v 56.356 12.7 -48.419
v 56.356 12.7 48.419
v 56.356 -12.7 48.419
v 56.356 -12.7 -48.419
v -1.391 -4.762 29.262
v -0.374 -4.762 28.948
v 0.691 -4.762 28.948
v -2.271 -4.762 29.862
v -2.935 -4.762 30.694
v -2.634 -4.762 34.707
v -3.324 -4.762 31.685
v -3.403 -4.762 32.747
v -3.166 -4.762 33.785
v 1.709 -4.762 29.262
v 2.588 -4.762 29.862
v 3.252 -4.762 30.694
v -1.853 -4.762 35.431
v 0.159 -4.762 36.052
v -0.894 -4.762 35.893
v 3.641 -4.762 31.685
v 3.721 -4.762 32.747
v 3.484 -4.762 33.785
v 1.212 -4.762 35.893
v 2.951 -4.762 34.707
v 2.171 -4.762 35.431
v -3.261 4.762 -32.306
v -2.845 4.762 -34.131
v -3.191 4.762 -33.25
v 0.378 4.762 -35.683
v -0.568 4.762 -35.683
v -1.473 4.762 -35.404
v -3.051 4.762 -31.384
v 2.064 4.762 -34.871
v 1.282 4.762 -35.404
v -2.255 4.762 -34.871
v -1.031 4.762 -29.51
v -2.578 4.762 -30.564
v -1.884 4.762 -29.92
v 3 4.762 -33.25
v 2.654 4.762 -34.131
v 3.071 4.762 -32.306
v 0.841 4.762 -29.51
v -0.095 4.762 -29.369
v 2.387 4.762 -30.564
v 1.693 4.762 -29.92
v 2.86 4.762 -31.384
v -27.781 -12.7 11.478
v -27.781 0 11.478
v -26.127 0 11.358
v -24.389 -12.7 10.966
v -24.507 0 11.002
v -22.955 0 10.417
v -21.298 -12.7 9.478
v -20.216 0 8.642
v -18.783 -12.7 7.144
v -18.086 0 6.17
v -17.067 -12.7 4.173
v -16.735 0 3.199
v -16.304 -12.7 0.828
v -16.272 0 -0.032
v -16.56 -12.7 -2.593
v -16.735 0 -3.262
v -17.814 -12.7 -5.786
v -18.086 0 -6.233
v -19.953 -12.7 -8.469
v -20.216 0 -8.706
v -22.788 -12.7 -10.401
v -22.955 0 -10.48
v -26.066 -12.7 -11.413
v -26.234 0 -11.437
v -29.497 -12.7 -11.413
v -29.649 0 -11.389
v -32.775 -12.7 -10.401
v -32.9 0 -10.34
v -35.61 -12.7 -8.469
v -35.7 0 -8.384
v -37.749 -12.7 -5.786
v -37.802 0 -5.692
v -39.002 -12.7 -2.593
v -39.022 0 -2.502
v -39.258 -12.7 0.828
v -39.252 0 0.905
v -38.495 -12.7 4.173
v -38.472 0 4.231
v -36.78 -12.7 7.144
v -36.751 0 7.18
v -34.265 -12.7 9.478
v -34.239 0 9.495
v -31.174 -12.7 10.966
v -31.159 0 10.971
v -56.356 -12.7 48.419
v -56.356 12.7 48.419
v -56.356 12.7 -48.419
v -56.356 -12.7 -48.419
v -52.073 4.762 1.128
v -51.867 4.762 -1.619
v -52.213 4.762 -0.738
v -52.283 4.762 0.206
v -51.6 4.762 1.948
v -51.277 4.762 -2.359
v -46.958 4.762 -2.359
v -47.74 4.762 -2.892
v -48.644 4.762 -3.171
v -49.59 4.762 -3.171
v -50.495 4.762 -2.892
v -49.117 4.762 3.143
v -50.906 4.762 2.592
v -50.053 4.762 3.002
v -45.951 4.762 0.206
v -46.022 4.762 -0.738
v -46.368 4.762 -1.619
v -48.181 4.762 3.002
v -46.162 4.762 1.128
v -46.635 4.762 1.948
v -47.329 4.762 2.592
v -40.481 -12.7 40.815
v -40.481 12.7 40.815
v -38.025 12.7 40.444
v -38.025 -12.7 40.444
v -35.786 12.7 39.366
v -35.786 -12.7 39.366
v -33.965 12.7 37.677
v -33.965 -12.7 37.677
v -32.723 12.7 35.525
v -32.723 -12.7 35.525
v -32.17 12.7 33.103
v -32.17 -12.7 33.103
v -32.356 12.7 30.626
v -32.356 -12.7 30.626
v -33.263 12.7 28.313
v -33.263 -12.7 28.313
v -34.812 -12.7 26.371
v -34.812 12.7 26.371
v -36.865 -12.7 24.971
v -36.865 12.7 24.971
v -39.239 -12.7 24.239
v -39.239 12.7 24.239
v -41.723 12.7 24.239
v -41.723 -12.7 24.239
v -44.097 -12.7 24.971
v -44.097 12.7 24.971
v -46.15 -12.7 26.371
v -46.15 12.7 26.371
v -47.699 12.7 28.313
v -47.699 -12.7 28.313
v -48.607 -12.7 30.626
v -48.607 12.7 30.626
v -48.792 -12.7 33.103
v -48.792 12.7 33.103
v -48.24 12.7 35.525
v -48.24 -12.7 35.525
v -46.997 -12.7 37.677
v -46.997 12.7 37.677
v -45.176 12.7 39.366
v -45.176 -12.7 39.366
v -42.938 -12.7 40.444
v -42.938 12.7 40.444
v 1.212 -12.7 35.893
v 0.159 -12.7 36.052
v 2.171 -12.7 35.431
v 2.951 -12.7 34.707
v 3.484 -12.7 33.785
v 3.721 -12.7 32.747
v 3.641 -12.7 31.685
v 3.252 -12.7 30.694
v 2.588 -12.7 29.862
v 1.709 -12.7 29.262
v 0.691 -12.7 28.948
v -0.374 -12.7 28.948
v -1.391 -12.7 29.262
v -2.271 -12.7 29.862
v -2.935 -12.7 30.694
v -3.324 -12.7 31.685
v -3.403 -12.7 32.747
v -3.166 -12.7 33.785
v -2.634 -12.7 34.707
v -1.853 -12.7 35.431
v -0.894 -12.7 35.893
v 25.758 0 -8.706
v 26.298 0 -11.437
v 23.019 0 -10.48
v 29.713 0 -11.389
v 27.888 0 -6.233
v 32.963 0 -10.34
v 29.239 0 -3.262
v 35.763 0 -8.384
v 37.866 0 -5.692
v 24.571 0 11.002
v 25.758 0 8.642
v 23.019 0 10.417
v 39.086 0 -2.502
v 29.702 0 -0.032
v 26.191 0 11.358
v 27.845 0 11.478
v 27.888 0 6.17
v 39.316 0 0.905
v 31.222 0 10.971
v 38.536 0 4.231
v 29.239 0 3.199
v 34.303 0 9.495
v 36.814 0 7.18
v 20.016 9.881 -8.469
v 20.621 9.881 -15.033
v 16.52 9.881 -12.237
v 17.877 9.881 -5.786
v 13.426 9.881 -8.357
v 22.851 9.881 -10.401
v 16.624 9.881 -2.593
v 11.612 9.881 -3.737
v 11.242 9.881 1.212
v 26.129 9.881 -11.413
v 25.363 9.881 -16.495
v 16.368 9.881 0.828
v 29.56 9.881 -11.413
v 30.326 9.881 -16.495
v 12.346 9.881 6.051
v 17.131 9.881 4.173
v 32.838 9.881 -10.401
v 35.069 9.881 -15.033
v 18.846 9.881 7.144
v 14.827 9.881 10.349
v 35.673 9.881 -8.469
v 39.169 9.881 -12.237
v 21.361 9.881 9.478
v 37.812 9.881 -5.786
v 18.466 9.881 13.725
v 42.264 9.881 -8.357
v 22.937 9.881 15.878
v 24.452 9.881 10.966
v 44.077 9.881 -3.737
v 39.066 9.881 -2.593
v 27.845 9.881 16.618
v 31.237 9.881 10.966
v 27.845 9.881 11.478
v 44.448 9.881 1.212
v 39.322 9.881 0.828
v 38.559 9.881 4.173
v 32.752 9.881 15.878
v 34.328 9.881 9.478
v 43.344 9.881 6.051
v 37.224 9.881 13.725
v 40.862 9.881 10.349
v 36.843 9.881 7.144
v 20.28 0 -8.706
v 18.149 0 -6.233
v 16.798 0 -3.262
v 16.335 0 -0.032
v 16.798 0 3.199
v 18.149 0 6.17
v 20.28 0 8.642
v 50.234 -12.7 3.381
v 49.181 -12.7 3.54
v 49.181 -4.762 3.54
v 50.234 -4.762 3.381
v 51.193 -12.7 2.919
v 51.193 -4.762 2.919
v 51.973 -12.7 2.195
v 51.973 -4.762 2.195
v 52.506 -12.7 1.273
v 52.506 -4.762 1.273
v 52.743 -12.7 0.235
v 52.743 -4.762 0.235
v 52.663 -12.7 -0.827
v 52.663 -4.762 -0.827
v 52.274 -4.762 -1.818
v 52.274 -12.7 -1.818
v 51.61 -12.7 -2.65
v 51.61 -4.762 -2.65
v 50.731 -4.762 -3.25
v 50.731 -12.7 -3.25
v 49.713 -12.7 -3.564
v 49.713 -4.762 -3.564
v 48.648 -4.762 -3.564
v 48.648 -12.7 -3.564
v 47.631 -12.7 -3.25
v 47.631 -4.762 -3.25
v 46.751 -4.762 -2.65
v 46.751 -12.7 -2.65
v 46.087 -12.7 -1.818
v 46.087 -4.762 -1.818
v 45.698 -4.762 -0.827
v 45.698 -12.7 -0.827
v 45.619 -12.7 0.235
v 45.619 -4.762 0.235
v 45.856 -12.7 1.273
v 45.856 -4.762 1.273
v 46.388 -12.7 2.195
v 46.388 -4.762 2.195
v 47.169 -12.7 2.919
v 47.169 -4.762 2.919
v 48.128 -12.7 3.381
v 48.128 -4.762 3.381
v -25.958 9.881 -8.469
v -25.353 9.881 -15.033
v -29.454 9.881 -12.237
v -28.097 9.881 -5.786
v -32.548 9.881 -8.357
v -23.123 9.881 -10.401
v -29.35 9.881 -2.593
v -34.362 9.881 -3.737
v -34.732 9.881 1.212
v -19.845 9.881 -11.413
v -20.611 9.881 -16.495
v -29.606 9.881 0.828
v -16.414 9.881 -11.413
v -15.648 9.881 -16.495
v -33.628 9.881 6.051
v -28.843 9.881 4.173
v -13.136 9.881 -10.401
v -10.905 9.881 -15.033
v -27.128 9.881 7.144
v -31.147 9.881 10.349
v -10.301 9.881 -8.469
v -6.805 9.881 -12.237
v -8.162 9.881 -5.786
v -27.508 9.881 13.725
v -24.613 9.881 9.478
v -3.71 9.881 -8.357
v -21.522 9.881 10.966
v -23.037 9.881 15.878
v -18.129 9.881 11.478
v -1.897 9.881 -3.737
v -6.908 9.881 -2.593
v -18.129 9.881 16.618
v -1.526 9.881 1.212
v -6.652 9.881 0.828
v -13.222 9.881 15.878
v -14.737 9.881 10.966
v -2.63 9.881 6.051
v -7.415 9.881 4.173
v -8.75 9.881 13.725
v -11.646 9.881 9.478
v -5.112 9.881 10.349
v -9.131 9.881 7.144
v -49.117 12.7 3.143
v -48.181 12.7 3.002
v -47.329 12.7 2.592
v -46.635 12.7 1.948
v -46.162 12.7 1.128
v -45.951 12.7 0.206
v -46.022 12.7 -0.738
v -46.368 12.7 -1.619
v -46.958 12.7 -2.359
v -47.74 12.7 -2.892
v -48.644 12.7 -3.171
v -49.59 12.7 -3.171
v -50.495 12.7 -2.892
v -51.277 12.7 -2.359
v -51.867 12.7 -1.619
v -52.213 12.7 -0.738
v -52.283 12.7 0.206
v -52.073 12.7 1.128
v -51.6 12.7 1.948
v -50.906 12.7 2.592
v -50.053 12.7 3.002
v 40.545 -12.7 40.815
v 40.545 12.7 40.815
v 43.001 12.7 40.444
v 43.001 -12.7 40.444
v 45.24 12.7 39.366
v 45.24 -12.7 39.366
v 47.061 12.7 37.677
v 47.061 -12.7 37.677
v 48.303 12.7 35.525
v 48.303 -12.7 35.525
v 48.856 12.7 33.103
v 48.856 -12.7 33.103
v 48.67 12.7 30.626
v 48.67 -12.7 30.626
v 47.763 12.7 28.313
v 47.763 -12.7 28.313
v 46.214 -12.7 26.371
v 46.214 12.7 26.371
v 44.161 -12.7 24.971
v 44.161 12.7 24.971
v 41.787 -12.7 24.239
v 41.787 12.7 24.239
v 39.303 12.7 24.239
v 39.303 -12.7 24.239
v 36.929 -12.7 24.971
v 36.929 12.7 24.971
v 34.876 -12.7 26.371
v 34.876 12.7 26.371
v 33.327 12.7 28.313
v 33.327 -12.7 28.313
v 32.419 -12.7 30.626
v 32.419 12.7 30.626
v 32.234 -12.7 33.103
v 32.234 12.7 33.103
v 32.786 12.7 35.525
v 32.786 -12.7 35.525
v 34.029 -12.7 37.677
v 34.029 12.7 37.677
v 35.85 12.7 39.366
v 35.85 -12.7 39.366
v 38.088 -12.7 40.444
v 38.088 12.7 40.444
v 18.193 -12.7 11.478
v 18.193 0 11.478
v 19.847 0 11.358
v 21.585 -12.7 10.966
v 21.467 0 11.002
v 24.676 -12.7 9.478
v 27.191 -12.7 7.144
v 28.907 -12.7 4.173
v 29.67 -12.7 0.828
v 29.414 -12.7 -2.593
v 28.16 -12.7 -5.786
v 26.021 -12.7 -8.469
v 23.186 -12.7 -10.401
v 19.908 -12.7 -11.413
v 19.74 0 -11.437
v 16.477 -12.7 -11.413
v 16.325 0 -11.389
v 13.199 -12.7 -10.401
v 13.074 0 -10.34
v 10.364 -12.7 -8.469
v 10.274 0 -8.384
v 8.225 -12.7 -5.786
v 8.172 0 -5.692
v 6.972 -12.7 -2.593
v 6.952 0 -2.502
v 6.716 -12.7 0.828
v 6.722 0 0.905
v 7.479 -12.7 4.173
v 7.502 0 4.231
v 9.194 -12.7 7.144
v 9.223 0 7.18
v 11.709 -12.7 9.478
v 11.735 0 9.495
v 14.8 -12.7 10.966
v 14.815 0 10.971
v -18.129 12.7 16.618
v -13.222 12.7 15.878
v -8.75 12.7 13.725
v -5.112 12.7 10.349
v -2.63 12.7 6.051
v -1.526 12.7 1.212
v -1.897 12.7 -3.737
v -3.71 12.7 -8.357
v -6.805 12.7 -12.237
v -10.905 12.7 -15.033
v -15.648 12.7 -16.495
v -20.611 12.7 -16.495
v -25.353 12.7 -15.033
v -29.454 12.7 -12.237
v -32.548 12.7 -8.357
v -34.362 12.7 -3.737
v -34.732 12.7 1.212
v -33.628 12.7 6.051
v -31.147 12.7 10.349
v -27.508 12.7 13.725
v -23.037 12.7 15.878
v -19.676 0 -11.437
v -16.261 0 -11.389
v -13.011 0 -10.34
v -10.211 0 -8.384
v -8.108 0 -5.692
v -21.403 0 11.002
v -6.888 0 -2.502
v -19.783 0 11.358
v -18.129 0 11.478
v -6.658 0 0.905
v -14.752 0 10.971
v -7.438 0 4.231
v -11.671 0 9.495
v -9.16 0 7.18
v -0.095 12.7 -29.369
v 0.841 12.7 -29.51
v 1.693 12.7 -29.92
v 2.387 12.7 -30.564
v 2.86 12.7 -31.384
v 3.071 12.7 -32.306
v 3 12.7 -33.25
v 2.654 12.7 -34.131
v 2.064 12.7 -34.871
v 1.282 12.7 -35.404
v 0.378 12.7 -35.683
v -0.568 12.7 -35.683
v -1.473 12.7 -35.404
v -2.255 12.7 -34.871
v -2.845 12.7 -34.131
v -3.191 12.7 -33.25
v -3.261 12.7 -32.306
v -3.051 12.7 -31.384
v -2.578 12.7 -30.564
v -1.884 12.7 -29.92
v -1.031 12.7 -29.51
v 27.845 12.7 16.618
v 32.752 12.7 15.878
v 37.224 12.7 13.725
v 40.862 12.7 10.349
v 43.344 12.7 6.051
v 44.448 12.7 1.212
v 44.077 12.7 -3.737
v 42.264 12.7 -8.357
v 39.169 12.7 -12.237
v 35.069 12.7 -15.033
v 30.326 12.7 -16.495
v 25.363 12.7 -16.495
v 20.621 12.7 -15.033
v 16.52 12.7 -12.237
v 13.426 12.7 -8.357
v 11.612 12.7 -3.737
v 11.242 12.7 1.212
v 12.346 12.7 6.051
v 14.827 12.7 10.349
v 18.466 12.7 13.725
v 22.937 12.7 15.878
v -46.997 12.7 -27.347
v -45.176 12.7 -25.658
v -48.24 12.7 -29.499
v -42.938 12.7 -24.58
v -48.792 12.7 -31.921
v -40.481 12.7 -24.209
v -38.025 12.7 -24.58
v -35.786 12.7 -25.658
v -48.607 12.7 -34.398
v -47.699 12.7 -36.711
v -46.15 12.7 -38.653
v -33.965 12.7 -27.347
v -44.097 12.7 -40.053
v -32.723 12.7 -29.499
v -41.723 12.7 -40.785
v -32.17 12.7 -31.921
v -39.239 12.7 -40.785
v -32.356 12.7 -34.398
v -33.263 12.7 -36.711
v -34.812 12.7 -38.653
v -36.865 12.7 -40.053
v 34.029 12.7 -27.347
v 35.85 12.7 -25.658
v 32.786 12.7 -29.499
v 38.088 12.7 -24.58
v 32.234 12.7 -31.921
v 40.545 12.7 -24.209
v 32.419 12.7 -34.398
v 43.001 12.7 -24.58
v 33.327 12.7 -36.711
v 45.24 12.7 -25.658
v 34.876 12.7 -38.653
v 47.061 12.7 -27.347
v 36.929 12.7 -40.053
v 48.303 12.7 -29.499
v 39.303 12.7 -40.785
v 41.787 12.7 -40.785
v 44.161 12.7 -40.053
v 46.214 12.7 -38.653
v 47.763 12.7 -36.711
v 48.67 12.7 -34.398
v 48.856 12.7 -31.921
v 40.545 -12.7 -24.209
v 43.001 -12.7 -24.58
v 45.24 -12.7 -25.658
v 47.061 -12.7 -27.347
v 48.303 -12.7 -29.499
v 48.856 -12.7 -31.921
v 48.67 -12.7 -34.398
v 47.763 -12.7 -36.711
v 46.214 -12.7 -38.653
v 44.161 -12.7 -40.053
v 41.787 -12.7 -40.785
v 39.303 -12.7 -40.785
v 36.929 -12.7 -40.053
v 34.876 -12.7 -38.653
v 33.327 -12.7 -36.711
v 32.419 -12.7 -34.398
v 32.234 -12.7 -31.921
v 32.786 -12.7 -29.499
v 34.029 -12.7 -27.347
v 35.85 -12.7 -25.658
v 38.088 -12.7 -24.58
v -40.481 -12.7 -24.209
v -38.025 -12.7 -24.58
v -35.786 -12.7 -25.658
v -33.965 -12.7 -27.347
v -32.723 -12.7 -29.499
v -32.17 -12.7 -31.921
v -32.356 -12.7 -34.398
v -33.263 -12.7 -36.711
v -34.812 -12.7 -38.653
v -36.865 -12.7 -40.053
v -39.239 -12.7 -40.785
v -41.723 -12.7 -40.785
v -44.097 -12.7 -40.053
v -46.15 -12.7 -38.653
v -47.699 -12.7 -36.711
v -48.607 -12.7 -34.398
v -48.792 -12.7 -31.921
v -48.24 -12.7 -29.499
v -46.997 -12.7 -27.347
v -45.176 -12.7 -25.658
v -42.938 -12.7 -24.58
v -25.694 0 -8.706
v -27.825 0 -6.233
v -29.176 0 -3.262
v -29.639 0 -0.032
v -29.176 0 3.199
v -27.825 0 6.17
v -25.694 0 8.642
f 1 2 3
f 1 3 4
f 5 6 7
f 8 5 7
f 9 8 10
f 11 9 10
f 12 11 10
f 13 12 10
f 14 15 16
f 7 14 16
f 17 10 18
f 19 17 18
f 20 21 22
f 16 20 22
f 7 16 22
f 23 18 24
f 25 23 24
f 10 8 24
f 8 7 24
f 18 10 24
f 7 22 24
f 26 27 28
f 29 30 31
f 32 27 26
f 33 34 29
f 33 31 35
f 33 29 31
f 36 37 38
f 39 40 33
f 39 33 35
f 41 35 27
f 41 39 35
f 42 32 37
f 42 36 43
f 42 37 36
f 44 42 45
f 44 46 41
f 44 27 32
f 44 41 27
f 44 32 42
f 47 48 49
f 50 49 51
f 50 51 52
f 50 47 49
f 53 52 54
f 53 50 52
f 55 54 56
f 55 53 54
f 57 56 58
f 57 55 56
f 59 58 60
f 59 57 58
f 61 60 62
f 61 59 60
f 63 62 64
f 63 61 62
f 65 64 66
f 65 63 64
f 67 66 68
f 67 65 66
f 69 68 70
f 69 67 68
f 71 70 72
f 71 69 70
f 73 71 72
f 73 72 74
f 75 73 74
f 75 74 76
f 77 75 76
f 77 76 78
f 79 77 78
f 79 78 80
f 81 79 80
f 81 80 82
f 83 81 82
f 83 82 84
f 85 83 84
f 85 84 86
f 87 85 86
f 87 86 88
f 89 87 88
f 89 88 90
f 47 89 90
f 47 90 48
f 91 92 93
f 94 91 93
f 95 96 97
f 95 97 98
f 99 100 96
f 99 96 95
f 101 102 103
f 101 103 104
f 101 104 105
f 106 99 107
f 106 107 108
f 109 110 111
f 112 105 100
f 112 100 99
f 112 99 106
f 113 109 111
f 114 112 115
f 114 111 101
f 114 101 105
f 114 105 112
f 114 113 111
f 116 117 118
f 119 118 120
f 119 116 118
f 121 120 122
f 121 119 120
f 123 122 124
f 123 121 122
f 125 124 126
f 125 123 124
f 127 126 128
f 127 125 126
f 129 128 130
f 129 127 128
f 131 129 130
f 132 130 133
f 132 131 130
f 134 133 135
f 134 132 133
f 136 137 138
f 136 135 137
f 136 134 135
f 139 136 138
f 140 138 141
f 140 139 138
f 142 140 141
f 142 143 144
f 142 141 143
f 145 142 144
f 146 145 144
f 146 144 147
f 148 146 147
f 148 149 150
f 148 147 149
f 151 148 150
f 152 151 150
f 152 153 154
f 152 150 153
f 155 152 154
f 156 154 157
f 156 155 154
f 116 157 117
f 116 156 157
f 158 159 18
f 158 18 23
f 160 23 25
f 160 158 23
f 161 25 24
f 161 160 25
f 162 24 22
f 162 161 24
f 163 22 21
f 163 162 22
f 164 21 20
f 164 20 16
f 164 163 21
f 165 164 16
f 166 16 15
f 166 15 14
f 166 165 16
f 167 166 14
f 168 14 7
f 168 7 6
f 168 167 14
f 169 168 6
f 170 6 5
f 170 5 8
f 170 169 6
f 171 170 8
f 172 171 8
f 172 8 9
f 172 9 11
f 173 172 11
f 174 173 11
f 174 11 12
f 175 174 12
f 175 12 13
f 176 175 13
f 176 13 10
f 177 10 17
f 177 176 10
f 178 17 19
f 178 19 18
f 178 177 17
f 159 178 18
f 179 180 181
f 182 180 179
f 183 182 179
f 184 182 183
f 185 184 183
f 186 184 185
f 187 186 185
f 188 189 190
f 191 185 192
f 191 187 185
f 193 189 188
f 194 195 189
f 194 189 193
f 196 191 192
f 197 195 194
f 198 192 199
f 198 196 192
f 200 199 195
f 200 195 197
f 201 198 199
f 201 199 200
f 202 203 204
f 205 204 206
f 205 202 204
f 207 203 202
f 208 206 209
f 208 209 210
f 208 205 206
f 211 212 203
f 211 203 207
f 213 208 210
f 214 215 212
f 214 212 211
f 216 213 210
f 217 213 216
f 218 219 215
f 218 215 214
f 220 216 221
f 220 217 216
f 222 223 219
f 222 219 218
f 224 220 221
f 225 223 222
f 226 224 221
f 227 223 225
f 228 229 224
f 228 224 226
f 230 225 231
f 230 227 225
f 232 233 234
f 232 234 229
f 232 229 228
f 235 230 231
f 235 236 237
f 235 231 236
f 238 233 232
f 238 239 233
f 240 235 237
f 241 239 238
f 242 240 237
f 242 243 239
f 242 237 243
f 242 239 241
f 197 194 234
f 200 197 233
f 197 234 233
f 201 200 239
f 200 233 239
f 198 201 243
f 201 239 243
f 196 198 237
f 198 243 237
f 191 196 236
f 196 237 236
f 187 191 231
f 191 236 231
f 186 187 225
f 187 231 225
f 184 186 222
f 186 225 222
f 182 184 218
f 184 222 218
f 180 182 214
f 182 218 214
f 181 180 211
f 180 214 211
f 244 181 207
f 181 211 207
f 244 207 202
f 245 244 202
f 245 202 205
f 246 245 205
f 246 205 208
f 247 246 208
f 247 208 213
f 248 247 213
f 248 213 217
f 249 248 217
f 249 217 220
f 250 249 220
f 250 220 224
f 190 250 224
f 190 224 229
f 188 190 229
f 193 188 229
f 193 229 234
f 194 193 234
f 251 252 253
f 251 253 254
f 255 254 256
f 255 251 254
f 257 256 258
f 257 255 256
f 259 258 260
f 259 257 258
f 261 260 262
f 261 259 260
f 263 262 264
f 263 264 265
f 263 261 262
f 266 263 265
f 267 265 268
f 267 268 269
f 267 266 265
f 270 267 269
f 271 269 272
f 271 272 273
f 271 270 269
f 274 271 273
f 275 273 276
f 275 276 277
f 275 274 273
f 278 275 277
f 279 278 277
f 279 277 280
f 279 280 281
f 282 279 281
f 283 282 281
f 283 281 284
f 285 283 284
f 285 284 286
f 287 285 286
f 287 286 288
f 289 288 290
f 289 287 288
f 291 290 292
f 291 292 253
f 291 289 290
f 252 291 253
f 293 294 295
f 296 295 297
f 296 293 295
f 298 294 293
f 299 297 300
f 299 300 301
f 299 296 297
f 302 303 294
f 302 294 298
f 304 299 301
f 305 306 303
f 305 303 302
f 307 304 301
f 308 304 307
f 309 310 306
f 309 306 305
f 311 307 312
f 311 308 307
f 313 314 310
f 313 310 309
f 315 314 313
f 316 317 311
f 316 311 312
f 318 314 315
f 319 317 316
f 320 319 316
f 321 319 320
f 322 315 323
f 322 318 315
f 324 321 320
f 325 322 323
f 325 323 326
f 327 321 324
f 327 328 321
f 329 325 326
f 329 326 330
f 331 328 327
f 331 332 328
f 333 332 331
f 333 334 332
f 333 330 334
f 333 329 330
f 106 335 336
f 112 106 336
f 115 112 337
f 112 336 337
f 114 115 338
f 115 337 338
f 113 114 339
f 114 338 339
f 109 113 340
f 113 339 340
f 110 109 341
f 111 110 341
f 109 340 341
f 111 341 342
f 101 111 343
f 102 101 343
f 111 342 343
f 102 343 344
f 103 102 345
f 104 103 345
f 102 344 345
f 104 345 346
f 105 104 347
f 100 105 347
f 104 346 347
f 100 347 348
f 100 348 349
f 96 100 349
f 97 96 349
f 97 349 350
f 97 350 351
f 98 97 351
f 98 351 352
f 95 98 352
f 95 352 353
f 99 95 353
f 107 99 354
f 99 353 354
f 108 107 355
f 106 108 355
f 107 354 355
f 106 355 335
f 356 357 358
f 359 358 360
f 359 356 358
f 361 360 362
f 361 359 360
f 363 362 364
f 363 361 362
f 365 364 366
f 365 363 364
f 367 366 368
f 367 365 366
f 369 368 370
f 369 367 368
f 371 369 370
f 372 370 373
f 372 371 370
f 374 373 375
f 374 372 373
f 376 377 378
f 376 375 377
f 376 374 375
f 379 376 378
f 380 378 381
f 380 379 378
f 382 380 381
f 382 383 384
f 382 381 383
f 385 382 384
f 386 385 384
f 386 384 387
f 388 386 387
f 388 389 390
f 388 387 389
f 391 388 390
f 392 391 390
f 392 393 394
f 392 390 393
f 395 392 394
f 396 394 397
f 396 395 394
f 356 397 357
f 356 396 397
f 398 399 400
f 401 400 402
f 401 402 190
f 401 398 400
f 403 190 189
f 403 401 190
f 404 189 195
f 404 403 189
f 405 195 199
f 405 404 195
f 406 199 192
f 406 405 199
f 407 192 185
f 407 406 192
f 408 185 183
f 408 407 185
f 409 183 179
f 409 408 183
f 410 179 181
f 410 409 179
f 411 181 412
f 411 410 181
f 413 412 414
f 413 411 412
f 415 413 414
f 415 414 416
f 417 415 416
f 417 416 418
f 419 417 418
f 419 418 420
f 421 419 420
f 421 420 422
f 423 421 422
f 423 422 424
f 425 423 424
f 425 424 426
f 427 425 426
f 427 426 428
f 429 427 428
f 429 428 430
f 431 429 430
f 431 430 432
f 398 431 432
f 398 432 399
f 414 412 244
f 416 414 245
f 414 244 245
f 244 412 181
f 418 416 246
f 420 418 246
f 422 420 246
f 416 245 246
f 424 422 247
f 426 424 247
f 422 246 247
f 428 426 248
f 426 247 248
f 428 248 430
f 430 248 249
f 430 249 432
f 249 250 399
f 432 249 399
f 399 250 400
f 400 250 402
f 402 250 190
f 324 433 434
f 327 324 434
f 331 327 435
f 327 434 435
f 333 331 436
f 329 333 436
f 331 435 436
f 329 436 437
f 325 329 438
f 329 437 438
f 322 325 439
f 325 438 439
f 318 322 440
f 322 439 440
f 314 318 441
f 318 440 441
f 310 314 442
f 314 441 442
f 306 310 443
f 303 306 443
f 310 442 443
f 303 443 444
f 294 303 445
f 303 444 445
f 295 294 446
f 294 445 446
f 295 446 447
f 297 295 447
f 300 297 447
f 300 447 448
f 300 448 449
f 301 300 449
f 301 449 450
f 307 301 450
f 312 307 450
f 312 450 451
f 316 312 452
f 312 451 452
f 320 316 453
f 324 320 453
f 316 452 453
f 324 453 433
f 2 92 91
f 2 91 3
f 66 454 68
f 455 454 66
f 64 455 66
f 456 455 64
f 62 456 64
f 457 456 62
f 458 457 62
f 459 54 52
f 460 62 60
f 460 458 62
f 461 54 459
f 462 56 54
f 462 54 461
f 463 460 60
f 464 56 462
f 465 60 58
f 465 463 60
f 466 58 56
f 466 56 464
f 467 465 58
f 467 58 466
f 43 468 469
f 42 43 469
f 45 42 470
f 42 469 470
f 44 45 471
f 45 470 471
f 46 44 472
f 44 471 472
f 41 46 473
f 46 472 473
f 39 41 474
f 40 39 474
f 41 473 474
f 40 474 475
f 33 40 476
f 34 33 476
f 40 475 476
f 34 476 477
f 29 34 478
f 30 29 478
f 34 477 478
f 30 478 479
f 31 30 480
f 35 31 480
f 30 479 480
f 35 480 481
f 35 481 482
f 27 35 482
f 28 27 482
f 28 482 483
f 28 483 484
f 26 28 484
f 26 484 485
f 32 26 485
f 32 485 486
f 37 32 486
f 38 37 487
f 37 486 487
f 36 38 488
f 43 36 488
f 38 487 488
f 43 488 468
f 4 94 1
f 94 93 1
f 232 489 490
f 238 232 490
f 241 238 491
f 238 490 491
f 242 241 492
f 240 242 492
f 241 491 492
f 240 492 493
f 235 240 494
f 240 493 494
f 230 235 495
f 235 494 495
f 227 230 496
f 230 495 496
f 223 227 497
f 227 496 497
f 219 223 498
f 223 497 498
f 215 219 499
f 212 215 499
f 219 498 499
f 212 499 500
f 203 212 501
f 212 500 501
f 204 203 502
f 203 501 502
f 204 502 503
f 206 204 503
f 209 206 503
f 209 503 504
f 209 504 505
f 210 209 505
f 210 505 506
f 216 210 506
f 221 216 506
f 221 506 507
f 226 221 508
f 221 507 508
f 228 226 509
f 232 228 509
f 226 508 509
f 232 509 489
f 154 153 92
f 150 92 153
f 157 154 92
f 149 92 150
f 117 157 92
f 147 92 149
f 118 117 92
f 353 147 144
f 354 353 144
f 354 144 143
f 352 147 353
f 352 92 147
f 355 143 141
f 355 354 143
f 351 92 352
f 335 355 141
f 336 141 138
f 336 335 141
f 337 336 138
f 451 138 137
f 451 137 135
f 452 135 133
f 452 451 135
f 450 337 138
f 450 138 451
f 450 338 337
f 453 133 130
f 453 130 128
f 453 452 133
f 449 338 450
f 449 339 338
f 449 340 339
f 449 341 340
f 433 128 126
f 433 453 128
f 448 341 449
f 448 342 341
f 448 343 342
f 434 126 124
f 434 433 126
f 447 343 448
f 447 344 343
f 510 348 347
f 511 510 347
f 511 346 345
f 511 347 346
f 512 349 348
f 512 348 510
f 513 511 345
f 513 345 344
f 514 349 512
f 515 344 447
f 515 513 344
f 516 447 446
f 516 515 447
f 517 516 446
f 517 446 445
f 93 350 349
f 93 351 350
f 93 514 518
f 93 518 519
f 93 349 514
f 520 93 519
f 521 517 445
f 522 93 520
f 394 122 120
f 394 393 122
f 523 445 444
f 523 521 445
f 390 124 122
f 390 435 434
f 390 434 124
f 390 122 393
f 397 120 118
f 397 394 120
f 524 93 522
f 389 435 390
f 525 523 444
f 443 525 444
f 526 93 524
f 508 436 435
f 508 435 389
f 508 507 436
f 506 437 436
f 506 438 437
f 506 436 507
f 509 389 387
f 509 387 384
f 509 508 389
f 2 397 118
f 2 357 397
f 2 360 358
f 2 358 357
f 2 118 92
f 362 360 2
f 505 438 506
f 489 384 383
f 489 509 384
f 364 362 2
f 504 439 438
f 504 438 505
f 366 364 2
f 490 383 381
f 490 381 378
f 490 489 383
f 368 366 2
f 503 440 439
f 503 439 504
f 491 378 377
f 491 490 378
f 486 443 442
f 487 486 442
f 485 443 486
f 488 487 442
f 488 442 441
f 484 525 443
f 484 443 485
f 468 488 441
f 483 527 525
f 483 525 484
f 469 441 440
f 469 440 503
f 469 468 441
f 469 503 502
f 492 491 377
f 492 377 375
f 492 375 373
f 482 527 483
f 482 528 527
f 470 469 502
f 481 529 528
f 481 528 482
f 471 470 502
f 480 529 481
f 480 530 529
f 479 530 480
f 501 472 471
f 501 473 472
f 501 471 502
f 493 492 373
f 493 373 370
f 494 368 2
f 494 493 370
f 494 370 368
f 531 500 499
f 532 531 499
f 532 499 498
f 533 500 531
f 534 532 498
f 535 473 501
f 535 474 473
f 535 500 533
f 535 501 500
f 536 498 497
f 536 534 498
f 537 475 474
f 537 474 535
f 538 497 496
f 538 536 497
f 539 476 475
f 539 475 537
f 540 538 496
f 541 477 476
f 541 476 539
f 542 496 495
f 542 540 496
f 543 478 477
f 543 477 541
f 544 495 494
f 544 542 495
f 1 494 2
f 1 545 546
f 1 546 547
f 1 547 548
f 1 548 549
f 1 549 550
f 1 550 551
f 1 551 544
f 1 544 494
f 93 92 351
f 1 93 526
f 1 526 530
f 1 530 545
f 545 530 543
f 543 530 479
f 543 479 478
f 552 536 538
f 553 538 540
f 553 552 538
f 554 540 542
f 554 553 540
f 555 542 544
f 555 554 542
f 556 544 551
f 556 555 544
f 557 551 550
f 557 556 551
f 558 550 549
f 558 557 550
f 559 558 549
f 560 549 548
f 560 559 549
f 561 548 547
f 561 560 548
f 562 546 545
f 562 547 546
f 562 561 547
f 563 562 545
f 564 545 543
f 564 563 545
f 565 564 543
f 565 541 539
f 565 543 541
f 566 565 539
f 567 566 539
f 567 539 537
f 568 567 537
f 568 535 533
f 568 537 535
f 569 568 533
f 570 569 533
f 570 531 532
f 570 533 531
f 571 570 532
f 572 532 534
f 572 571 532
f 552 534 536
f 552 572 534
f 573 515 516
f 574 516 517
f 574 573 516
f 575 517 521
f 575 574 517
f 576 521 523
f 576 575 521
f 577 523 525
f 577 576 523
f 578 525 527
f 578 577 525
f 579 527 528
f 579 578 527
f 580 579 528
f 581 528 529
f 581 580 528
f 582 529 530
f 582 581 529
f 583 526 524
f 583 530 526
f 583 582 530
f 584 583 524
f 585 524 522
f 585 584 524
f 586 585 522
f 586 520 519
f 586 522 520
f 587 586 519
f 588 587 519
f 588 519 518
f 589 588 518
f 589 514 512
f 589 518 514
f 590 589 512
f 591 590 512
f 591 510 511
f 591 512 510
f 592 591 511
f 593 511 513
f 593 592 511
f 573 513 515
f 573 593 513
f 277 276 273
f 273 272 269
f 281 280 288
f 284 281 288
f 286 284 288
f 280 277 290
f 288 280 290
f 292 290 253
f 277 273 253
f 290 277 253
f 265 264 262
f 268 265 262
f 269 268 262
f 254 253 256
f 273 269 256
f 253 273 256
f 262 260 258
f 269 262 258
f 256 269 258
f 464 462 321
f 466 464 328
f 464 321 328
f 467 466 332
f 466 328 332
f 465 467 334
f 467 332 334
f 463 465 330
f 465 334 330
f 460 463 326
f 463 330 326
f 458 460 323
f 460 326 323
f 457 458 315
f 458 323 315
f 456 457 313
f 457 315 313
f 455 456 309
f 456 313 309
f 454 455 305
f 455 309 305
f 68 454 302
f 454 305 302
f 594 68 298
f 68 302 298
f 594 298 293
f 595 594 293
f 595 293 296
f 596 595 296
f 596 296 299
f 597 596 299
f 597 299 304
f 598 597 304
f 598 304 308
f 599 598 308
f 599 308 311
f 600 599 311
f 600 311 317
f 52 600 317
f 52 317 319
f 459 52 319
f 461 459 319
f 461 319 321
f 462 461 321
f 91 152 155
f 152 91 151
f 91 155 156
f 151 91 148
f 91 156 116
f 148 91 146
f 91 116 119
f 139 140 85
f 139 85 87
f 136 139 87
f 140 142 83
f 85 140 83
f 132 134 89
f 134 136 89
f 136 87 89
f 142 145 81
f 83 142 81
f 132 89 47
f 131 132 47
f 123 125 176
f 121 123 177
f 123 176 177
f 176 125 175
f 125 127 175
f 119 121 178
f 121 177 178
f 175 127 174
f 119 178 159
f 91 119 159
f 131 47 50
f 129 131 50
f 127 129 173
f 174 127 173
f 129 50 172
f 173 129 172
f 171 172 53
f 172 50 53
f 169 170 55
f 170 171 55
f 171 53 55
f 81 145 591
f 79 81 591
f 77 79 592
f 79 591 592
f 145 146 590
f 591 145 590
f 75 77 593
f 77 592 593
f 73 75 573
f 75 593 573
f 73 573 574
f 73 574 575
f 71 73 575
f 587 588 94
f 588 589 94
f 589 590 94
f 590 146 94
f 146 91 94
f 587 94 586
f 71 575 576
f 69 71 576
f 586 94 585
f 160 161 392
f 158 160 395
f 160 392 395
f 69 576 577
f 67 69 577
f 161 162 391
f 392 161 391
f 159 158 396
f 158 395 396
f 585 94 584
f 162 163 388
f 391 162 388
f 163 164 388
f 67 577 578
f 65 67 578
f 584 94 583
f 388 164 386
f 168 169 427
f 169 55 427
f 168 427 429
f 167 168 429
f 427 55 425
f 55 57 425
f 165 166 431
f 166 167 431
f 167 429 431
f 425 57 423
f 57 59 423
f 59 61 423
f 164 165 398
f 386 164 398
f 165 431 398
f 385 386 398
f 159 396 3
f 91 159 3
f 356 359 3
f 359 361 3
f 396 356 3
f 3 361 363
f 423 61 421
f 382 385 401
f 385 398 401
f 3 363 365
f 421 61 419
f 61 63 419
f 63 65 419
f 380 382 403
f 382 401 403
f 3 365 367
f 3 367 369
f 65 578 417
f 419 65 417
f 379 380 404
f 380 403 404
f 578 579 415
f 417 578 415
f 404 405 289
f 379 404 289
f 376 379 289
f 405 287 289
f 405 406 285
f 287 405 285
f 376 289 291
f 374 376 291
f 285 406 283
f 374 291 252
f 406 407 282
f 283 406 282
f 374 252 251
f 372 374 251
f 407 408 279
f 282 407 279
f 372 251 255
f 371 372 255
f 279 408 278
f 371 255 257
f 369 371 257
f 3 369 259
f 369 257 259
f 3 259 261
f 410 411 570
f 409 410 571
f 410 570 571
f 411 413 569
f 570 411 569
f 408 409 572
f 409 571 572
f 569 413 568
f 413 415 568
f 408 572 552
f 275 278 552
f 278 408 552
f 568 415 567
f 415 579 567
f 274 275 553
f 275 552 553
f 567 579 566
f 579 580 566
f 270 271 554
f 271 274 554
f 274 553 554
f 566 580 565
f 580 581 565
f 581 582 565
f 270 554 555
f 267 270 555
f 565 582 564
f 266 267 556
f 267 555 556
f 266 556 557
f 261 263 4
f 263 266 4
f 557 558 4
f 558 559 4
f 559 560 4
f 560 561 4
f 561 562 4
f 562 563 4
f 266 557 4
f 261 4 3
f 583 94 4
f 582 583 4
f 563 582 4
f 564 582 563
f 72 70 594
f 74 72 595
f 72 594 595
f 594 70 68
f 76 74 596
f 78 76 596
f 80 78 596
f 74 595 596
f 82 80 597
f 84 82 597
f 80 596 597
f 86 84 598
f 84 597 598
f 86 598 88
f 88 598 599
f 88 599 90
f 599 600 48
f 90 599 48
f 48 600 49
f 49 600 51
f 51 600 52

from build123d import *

# Parameters (mm, degrees)
SKETCH1_W           = 112.7125
SKETCH1_H           = 96.8375
BOSS_EXTRUDE1_DEPTH = 12.7
CUT_EXTRUDE2_START  = -12.7
SKETCH2_R           = 8.334375
CUT_EXTRUDE2_DEPTH  = 89.077000906
CUT_EXTRUDE4_START  = -12.7
SKETCH3_R           = 11.509375
CUT_EXTRUDE4_DEPTH  = 12.7
CUT_EXTRUDE6_START  = 12.7
SKETCH4_R           = 11.509375
CUT_EXTRUDE6_DEPTH  = 12.7
CUT_EXTRUDE8_START  = 12.7
SKETCH5_R           = 16.6497
CUT_EXTRUDE8_DEPTH  = 2.8194
CUT_EXTRUDE10_START = -12.7
SKETCH6_R           = 3.571875
CUT_EXTRUDE10_DEPTH = 7.9375
CUT_EXTRUDE12_START = 12.7
SKETCH7_R           = 3.175
CUT_EXTRUDE12_DEPTH = 7.9375


with BuildPart() as part:
    # Sketch1 → Boss-Extrude1 (new, symmetric)
    with BuildSketch(Plane(origin=(0, 0, 0), x_dir=(1, 0, 0), z_dir=(0, 1, 0))):
        Rectangle(SKETCH1_W, SKETCH1_H)
    extrude(amount=BOSS_EXTRUDE1_DEPTH, both=True)

    # Sketch2 → Cut-Extrude2 (cut, through all)
    with BuildSketch(Plane(origin=(0, 0, 0), x_dir=(1, 0, 0), z_dir=(0, 1, 0)).offset(CUT_EXTRUDE2_START)):
        with Locations(Location((-40.48125, -32.48025, 0), (0, 0, 270))):
            Circle(SKETCH2_R)
        with Locations(Location((40.54475, -32.48025, 0), (0, 0, 270))):
            Circle(SKETCH2_R)
        with Locations(Location((-40.48125, 32.54375, 0), (0, 0, 270))):
            Circle(SKETCH2_R)
        with Locations(Location((40.54475, 32.54375, 0), (0, 0, 270))):
            Circle(SKETCH2_R)
    extrude(amount=CUT_EXTRUDE2_DEPTH, mode=Mode.SUBTRACT)

    # Sketch3 → Cut-Extrude4 (cut)
    with BuildSketch(Plane(origin=(0, 0, 0), x_dir=(1, 0, 0), z_dir=(0, 1, 0)).offset(CUT_EXTRUDE4_START)):
        with Locations(Location((-27.78125, 0.03175, 0), (0, 0, 270))):
            Circle(SKETCH3_R)
        with Locations(Location((18.19275, 0.03175, 0), (0, 0, 270))):
            Circle(SKETCH3_R)
    extrude(amount=CUT_EXTRUDE4_DEPTH, mode=Mode.SUBTRACT)

    # Sketch4 → Cut-Extrude6 (cut)
    with BuildSketch(Plane(origin=(0, 0, 0), x_dir=(1, 0, 0), z_dir=(0, 1, 0)).offset(CUT_EXTRUDE6_START)):
        with Locations(Location((-18.12925, 0.03175, 0), (0, 0, 270))):
            Circle(SKETCH4_R)
        with Locations(Location((27.84475, 0.03175, 0), (0, 0, 270))):
            Circle(SKETCH4_R)
    extrude(amount=-CUT_EXTRUDE6_DEPTH, mode=Mode.SUBTRACT)

    # Sketch5 → Cut-Extrude8 (cut)
    with BuildSketch(Plane(origin=(0, 0, 0), x_dir=(1, 0, 0), z_dir=(0, 1, 0)).offset(CUT_EXTRUDE8_START)):
        with Locations(Location((-18.12925, 0.03175, 0), (0, 0, 270))):
            Circle(SKETCH5_R)
        with Locations(Location((27.84475, 0.03175, 0), (0, 0, 270))):
            Circle(SKETCH5_R)
    extrude(amount=-CUT_EXTRUDE8_DEPTH, mode=Mode.SUBTRACT)

    # Sketch6 → Cut-Extrude10 (cut)
    with BuildSketch(Plane(origin=(0, 0, 0), x_dir=(1, 0, 0), z_dir=(0, 1, 0)).offset(CUT_EXTRUDE10_START)):
        with Locations(Location((49.18075, 0.03175, 0), (0, 0, 270))):
            Circle(SKETCH6_R)
        with Locations(Location((0.15875, -32.48025, 0), (0, 0, 270))):
            Circle(SKETCH6_R)
    extrude(amount=CUT_EXTRUDE10_DEPTH, mode=Mode.SUBTRACT)

    # Sketch7 → Cut-Extrude12 (cut)
    with BuildSketch(Plane(origin=(0, 0, 0), x_dir=(1, 0, 0), z_dir=(0, 1, 0)).offset(CUT_EXTRUDE12_START)):
        with Locations(Location((-49.11725, 0.03175, 0), (0, 0, 270))):
            Circle(SKETCH7_R)
        with Locations(Location((-0.09525, 32.54375, 0), (0, 0, 270))):
            Circle(SKETCH7_R)
    extrude(amount=-CUT_EXTRUDE12_DEPTH, mode=Mode.SUBTRACT)


solid = part.part
